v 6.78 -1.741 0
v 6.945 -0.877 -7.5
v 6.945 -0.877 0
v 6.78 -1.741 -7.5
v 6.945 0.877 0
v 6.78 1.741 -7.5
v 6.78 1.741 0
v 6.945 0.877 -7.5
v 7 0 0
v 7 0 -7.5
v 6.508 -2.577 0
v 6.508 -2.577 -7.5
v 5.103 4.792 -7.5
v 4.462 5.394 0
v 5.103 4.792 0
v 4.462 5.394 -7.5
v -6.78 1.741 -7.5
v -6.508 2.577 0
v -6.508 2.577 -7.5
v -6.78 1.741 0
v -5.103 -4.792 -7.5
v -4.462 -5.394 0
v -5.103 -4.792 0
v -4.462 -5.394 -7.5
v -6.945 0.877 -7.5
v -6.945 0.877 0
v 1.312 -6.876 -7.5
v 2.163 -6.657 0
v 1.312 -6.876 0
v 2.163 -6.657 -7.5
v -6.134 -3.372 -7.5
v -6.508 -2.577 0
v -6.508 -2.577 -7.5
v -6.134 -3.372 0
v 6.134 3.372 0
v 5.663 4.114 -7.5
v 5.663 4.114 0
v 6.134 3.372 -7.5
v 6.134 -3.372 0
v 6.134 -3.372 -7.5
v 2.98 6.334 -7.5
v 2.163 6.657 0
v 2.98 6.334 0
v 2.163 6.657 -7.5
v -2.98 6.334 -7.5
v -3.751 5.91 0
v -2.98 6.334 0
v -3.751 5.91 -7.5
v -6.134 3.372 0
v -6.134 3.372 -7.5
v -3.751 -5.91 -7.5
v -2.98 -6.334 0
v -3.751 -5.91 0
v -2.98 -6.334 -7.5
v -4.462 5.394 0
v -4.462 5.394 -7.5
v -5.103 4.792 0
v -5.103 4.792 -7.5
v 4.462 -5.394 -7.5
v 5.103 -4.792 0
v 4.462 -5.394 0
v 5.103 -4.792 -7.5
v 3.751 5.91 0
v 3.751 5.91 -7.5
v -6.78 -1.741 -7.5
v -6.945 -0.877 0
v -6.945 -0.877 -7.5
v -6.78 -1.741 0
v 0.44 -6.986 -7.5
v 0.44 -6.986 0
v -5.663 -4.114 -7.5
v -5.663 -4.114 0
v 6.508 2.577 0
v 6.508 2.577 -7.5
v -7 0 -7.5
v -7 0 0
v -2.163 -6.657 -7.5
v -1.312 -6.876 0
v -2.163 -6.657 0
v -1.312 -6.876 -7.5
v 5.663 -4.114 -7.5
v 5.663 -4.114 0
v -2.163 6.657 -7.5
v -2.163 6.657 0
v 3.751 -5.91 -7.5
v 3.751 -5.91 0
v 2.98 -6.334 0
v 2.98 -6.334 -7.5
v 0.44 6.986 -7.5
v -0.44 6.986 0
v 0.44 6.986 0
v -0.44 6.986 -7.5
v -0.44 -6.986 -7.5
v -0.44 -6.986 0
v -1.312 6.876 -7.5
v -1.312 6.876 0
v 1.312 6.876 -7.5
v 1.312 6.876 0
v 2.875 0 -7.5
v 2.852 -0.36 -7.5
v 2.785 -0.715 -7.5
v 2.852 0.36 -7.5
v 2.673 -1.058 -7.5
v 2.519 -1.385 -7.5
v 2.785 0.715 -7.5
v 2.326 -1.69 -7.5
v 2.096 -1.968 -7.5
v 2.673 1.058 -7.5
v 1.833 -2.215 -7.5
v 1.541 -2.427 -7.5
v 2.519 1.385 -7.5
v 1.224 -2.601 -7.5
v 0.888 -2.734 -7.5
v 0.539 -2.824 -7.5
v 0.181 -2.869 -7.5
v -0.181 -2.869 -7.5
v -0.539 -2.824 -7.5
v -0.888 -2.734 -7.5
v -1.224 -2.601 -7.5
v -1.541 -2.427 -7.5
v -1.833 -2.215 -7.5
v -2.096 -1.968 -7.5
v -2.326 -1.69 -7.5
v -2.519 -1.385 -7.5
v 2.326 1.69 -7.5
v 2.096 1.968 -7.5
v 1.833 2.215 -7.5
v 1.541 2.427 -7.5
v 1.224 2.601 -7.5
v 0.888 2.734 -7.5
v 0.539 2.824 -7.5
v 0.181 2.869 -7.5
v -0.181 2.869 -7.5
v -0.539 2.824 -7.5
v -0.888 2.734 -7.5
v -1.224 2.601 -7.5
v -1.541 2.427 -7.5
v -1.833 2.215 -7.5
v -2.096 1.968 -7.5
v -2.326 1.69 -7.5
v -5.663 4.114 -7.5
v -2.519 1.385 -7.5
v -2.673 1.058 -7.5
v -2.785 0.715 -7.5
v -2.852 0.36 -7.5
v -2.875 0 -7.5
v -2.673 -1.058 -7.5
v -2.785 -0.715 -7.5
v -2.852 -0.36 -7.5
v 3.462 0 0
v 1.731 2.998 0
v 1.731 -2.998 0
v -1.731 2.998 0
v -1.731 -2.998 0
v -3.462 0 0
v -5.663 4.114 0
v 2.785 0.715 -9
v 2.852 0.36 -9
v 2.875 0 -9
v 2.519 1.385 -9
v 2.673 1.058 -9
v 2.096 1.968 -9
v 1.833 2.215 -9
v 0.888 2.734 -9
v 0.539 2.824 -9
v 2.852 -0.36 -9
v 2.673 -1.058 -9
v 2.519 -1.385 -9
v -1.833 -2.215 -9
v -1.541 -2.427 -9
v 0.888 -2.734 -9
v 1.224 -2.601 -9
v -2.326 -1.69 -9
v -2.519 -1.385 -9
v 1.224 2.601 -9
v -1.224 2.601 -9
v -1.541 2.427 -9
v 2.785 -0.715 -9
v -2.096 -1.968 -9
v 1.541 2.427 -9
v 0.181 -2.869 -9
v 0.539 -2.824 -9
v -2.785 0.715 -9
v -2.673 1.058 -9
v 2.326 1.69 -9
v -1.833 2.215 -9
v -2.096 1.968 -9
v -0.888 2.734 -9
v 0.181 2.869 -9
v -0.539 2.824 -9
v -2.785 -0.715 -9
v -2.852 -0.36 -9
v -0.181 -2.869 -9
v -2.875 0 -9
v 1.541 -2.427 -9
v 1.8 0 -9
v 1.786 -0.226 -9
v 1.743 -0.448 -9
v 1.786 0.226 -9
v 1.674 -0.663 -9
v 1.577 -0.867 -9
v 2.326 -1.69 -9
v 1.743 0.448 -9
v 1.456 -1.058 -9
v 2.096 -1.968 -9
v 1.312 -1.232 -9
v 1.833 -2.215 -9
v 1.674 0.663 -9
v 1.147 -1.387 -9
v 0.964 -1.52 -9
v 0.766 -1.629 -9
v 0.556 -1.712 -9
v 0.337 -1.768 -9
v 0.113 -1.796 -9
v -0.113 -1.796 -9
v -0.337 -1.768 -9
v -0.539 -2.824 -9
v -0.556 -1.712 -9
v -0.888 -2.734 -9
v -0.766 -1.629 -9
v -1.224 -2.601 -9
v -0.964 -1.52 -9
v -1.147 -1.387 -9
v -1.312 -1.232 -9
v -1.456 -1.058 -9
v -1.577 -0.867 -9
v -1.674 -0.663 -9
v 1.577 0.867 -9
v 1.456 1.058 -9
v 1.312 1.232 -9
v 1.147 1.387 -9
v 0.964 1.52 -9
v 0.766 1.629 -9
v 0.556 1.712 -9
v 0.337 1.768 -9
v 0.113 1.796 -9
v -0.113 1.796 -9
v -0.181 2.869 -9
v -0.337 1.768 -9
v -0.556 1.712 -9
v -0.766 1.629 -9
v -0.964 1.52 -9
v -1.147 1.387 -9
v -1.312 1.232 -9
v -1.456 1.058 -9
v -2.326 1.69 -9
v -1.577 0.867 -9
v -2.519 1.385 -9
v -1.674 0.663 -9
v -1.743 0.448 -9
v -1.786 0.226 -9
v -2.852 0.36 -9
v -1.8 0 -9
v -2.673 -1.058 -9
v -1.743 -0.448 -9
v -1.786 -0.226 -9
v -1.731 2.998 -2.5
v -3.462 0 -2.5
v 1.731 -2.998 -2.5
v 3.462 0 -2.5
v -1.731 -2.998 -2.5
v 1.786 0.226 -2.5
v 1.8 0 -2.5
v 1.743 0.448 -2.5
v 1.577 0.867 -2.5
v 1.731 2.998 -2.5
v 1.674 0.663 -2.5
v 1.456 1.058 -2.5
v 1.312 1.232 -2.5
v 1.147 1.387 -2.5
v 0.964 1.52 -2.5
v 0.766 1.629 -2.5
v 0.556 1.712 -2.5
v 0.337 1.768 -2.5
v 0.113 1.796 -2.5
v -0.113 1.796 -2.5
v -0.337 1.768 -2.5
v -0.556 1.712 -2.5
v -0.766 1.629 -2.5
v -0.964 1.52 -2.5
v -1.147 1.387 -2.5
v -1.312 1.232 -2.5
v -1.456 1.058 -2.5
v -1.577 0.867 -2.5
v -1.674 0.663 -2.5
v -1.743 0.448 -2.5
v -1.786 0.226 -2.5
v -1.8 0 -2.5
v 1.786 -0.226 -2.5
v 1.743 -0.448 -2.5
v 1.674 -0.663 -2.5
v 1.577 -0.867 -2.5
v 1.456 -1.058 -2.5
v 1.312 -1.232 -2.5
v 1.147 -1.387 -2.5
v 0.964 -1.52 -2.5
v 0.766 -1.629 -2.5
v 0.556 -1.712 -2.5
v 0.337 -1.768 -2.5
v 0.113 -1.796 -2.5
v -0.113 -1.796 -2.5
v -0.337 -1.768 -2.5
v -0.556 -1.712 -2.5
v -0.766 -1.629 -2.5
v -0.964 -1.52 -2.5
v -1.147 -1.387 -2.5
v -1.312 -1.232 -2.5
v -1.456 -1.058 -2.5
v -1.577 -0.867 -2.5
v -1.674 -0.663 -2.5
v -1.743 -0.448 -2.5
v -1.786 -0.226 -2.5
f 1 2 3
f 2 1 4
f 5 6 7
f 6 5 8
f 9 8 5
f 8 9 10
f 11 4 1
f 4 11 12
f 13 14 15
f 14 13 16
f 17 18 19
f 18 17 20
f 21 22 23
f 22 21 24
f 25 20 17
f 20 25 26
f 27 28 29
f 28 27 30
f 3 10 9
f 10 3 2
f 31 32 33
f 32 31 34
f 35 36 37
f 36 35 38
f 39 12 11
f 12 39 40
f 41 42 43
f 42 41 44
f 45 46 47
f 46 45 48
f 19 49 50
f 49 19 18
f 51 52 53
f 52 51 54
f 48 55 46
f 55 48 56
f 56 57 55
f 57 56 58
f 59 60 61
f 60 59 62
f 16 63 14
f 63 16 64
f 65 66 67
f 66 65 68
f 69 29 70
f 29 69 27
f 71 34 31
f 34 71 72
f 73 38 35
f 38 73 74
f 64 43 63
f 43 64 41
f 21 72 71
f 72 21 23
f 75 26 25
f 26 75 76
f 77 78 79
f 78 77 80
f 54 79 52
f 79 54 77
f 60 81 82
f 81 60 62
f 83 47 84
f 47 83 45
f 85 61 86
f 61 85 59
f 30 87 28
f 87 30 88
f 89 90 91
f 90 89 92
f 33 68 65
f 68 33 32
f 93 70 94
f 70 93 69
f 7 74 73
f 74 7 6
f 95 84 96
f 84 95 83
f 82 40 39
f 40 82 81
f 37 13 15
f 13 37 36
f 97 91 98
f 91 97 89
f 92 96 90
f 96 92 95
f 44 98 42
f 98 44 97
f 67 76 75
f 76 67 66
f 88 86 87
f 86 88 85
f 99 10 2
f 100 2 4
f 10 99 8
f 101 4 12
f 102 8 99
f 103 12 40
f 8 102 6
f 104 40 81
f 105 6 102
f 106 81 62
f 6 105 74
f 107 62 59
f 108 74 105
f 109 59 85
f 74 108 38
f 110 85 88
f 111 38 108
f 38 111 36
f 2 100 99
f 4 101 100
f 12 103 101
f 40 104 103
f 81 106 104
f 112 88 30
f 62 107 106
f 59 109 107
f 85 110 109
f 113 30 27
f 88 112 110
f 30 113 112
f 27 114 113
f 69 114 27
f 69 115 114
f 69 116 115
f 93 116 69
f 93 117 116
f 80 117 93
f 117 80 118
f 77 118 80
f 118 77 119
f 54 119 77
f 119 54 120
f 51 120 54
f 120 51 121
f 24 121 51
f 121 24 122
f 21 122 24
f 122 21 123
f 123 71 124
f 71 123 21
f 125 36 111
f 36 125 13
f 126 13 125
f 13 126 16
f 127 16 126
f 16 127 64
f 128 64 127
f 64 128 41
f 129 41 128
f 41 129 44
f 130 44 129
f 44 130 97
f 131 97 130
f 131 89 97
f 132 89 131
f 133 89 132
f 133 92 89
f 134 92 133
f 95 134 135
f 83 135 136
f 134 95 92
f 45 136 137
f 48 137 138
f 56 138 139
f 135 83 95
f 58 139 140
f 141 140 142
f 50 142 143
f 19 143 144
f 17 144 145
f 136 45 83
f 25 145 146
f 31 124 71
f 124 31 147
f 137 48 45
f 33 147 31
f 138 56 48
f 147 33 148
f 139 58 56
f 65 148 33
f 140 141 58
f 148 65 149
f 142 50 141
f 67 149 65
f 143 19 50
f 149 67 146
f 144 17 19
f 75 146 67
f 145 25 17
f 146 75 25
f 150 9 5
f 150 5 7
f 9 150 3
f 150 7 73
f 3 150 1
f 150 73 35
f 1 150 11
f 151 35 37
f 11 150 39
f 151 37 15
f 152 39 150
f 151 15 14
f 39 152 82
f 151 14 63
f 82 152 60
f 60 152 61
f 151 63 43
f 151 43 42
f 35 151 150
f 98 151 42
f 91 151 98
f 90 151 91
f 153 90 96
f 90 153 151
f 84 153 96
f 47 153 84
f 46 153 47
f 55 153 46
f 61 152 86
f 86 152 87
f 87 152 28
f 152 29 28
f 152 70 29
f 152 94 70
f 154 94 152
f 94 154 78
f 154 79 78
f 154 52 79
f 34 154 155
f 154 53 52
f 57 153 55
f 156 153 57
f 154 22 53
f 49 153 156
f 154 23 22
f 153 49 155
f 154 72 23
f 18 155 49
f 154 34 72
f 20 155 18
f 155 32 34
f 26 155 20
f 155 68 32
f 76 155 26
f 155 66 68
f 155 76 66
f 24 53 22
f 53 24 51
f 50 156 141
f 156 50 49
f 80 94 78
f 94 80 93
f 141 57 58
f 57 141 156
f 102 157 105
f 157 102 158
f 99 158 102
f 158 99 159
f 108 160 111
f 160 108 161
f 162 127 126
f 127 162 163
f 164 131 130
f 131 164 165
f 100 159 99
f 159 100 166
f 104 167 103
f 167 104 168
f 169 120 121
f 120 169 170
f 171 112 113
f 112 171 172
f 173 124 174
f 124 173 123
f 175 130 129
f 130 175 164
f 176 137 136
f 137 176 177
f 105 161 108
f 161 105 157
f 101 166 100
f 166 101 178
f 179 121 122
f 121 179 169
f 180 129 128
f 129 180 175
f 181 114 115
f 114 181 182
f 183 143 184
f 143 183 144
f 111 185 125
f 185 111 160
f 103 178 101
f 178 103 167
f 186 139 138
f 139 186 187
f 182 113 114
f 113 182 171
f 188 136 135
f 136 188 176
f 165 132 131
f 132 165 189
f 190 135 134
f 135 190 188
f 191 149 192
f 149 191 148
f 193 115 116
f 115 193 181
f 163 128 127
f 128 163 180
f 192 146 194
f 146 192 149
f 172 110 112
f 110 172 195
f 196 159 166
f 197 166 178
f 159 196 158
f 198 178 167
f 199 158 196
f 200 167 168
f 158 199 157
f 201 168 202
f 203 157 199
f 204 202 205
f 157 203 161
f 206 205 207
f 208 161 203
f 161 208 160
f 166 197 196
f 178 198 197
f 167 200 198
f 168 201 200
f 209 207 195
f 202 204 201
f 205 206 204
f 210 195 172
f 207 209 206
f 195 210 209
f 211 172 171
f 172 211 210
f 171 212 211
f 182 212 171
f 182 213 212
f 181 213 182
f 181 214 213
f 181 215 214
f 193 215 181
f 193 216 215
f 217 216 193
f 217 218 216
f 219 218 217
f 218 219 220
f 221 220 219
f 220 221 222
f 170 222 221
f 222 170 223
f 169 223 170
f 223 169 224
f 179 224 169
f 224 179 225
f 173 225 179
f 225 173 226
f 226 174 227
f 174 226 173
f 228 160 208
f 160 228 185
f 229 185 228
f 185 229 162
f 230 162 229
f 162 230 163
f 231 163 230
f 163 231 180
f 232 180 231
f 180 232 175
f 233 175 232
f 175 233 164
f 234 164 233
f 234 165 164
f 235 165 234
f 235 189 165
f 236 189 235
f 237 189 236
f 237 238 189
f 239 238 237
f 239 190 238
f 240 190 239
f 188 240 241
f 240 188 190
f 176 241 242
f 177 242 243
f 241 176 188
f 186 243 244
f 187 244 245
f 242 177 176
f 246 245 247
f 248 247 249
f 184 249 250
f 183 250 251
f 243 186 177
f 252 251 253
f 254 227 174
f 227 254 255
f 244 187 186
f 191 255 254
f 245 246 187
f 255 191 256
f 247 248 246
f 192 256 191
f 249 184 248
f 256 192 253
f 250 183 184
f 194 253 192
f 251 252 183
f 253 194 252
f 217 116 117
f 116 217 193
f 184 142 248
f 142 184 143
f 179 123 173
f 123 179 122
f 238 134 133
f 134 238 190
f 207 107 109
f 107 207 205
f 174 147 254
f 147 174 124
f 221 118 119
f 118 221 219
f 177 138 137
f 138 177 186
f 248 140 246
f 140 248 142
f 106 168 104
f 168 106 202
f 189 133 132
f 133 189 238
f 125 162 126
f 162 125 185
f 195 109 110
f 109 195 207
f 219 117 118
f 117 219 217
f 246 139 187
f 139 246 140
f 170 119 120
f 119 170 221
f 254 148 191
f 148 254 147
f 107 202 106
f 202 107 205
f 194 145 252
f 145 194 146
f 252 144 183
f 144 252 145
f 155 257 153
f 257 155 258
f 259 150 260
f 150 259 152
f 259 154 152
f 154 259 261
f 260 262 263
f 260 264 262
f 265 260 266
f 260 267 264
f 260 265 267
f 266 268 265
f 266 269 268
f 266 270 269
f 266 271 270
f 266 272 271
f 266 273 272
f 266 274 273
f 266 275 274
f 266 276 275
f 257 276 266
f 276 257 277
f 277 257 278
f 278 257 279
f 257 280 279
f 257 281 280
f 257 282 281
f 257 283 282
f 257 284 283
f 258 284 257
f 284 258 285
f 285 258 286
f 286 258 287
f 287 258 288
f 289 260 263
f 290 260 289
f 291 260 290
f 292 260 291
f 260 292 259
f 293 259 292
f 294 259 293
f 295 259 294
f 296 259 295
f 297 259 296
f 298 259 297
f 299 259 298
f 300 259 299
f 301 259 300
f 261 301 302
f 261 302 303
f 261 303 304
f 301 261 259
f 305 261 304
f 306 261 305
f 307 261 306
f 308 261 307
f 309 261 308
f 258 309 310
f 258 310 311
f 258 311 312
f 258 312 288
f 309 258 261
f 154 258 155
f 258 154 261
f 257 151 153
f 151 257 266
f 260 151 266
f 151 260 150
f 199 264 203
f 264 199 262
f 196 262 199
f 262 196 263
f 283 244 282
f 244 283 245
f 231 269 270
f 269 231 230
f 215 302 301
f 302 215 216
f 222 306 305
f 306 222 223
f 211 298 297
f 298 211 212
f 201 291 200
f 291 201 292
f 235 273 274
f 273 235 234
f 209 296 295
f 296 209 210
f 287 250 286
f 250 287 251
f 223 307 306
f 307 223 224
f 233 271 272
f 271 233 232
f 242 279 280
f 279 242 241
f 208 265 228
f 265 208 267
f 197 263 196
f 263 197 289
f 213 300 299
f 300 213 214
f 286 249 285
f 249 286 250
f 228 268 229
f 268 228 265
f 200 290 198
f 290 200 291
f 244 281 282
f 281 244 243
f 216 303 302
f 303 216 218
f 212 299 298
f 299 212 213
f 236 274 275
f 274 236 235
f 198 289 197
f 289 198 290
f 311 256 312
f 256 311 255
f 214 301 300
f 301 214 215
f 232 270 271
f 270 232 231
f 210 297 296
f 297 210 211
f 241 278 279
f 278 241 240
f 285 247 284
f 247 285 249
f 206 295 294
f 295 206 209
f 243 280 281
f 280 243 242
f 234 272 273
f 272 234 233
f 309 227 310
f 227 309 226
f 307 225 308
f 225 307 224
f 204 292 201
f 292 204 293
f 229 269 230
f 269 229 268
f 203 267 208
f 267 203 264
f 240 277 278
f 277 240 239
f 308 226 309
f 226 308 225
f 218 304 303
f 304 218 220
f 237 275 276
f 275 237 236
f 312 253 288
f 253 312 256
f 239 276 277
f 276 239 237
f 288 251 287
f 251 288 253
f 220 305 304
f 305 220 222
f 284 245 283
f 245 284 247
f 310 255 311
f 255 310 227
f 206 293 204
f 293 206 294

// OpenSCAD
$fn = 50;


difference() {
	union() {
		translate(v = [0, 0, -7.5000000000]) {
			cylinder(h = 7.5000000000, r = 7.0000000000);
		}
		#translate(v = [0, 0, -9.0000000000]) {
			cylinder(h = 9, r = 2.8750000000);
		}
	}
	union() {
		translate(v = [0, 0, 0]) {
			rotate(a = [0, 0, 0]) {
				difference() {
					union() {
						translate(v = [0, 0, -2.5000000000]) {
							linear_extrude(height = 2.5000000000) {
								polygon(points = [[3.4620000000, 0.0000000000], [1.7310000000, 2.9981799479], [-1.7310000000, 2.9981799479], [-3.4620000000, 0.0000000000], [-1.7310000000, -2.9981799479], [1.7310000000, -2.9981799479]]);
							}
						}
					}
					union();
				}
			}
		}
		#translate(v = [0, 0, -100.0000000000]) {
			cylinder(h = 200, r = 1.8000000000);
		}
	}
}
